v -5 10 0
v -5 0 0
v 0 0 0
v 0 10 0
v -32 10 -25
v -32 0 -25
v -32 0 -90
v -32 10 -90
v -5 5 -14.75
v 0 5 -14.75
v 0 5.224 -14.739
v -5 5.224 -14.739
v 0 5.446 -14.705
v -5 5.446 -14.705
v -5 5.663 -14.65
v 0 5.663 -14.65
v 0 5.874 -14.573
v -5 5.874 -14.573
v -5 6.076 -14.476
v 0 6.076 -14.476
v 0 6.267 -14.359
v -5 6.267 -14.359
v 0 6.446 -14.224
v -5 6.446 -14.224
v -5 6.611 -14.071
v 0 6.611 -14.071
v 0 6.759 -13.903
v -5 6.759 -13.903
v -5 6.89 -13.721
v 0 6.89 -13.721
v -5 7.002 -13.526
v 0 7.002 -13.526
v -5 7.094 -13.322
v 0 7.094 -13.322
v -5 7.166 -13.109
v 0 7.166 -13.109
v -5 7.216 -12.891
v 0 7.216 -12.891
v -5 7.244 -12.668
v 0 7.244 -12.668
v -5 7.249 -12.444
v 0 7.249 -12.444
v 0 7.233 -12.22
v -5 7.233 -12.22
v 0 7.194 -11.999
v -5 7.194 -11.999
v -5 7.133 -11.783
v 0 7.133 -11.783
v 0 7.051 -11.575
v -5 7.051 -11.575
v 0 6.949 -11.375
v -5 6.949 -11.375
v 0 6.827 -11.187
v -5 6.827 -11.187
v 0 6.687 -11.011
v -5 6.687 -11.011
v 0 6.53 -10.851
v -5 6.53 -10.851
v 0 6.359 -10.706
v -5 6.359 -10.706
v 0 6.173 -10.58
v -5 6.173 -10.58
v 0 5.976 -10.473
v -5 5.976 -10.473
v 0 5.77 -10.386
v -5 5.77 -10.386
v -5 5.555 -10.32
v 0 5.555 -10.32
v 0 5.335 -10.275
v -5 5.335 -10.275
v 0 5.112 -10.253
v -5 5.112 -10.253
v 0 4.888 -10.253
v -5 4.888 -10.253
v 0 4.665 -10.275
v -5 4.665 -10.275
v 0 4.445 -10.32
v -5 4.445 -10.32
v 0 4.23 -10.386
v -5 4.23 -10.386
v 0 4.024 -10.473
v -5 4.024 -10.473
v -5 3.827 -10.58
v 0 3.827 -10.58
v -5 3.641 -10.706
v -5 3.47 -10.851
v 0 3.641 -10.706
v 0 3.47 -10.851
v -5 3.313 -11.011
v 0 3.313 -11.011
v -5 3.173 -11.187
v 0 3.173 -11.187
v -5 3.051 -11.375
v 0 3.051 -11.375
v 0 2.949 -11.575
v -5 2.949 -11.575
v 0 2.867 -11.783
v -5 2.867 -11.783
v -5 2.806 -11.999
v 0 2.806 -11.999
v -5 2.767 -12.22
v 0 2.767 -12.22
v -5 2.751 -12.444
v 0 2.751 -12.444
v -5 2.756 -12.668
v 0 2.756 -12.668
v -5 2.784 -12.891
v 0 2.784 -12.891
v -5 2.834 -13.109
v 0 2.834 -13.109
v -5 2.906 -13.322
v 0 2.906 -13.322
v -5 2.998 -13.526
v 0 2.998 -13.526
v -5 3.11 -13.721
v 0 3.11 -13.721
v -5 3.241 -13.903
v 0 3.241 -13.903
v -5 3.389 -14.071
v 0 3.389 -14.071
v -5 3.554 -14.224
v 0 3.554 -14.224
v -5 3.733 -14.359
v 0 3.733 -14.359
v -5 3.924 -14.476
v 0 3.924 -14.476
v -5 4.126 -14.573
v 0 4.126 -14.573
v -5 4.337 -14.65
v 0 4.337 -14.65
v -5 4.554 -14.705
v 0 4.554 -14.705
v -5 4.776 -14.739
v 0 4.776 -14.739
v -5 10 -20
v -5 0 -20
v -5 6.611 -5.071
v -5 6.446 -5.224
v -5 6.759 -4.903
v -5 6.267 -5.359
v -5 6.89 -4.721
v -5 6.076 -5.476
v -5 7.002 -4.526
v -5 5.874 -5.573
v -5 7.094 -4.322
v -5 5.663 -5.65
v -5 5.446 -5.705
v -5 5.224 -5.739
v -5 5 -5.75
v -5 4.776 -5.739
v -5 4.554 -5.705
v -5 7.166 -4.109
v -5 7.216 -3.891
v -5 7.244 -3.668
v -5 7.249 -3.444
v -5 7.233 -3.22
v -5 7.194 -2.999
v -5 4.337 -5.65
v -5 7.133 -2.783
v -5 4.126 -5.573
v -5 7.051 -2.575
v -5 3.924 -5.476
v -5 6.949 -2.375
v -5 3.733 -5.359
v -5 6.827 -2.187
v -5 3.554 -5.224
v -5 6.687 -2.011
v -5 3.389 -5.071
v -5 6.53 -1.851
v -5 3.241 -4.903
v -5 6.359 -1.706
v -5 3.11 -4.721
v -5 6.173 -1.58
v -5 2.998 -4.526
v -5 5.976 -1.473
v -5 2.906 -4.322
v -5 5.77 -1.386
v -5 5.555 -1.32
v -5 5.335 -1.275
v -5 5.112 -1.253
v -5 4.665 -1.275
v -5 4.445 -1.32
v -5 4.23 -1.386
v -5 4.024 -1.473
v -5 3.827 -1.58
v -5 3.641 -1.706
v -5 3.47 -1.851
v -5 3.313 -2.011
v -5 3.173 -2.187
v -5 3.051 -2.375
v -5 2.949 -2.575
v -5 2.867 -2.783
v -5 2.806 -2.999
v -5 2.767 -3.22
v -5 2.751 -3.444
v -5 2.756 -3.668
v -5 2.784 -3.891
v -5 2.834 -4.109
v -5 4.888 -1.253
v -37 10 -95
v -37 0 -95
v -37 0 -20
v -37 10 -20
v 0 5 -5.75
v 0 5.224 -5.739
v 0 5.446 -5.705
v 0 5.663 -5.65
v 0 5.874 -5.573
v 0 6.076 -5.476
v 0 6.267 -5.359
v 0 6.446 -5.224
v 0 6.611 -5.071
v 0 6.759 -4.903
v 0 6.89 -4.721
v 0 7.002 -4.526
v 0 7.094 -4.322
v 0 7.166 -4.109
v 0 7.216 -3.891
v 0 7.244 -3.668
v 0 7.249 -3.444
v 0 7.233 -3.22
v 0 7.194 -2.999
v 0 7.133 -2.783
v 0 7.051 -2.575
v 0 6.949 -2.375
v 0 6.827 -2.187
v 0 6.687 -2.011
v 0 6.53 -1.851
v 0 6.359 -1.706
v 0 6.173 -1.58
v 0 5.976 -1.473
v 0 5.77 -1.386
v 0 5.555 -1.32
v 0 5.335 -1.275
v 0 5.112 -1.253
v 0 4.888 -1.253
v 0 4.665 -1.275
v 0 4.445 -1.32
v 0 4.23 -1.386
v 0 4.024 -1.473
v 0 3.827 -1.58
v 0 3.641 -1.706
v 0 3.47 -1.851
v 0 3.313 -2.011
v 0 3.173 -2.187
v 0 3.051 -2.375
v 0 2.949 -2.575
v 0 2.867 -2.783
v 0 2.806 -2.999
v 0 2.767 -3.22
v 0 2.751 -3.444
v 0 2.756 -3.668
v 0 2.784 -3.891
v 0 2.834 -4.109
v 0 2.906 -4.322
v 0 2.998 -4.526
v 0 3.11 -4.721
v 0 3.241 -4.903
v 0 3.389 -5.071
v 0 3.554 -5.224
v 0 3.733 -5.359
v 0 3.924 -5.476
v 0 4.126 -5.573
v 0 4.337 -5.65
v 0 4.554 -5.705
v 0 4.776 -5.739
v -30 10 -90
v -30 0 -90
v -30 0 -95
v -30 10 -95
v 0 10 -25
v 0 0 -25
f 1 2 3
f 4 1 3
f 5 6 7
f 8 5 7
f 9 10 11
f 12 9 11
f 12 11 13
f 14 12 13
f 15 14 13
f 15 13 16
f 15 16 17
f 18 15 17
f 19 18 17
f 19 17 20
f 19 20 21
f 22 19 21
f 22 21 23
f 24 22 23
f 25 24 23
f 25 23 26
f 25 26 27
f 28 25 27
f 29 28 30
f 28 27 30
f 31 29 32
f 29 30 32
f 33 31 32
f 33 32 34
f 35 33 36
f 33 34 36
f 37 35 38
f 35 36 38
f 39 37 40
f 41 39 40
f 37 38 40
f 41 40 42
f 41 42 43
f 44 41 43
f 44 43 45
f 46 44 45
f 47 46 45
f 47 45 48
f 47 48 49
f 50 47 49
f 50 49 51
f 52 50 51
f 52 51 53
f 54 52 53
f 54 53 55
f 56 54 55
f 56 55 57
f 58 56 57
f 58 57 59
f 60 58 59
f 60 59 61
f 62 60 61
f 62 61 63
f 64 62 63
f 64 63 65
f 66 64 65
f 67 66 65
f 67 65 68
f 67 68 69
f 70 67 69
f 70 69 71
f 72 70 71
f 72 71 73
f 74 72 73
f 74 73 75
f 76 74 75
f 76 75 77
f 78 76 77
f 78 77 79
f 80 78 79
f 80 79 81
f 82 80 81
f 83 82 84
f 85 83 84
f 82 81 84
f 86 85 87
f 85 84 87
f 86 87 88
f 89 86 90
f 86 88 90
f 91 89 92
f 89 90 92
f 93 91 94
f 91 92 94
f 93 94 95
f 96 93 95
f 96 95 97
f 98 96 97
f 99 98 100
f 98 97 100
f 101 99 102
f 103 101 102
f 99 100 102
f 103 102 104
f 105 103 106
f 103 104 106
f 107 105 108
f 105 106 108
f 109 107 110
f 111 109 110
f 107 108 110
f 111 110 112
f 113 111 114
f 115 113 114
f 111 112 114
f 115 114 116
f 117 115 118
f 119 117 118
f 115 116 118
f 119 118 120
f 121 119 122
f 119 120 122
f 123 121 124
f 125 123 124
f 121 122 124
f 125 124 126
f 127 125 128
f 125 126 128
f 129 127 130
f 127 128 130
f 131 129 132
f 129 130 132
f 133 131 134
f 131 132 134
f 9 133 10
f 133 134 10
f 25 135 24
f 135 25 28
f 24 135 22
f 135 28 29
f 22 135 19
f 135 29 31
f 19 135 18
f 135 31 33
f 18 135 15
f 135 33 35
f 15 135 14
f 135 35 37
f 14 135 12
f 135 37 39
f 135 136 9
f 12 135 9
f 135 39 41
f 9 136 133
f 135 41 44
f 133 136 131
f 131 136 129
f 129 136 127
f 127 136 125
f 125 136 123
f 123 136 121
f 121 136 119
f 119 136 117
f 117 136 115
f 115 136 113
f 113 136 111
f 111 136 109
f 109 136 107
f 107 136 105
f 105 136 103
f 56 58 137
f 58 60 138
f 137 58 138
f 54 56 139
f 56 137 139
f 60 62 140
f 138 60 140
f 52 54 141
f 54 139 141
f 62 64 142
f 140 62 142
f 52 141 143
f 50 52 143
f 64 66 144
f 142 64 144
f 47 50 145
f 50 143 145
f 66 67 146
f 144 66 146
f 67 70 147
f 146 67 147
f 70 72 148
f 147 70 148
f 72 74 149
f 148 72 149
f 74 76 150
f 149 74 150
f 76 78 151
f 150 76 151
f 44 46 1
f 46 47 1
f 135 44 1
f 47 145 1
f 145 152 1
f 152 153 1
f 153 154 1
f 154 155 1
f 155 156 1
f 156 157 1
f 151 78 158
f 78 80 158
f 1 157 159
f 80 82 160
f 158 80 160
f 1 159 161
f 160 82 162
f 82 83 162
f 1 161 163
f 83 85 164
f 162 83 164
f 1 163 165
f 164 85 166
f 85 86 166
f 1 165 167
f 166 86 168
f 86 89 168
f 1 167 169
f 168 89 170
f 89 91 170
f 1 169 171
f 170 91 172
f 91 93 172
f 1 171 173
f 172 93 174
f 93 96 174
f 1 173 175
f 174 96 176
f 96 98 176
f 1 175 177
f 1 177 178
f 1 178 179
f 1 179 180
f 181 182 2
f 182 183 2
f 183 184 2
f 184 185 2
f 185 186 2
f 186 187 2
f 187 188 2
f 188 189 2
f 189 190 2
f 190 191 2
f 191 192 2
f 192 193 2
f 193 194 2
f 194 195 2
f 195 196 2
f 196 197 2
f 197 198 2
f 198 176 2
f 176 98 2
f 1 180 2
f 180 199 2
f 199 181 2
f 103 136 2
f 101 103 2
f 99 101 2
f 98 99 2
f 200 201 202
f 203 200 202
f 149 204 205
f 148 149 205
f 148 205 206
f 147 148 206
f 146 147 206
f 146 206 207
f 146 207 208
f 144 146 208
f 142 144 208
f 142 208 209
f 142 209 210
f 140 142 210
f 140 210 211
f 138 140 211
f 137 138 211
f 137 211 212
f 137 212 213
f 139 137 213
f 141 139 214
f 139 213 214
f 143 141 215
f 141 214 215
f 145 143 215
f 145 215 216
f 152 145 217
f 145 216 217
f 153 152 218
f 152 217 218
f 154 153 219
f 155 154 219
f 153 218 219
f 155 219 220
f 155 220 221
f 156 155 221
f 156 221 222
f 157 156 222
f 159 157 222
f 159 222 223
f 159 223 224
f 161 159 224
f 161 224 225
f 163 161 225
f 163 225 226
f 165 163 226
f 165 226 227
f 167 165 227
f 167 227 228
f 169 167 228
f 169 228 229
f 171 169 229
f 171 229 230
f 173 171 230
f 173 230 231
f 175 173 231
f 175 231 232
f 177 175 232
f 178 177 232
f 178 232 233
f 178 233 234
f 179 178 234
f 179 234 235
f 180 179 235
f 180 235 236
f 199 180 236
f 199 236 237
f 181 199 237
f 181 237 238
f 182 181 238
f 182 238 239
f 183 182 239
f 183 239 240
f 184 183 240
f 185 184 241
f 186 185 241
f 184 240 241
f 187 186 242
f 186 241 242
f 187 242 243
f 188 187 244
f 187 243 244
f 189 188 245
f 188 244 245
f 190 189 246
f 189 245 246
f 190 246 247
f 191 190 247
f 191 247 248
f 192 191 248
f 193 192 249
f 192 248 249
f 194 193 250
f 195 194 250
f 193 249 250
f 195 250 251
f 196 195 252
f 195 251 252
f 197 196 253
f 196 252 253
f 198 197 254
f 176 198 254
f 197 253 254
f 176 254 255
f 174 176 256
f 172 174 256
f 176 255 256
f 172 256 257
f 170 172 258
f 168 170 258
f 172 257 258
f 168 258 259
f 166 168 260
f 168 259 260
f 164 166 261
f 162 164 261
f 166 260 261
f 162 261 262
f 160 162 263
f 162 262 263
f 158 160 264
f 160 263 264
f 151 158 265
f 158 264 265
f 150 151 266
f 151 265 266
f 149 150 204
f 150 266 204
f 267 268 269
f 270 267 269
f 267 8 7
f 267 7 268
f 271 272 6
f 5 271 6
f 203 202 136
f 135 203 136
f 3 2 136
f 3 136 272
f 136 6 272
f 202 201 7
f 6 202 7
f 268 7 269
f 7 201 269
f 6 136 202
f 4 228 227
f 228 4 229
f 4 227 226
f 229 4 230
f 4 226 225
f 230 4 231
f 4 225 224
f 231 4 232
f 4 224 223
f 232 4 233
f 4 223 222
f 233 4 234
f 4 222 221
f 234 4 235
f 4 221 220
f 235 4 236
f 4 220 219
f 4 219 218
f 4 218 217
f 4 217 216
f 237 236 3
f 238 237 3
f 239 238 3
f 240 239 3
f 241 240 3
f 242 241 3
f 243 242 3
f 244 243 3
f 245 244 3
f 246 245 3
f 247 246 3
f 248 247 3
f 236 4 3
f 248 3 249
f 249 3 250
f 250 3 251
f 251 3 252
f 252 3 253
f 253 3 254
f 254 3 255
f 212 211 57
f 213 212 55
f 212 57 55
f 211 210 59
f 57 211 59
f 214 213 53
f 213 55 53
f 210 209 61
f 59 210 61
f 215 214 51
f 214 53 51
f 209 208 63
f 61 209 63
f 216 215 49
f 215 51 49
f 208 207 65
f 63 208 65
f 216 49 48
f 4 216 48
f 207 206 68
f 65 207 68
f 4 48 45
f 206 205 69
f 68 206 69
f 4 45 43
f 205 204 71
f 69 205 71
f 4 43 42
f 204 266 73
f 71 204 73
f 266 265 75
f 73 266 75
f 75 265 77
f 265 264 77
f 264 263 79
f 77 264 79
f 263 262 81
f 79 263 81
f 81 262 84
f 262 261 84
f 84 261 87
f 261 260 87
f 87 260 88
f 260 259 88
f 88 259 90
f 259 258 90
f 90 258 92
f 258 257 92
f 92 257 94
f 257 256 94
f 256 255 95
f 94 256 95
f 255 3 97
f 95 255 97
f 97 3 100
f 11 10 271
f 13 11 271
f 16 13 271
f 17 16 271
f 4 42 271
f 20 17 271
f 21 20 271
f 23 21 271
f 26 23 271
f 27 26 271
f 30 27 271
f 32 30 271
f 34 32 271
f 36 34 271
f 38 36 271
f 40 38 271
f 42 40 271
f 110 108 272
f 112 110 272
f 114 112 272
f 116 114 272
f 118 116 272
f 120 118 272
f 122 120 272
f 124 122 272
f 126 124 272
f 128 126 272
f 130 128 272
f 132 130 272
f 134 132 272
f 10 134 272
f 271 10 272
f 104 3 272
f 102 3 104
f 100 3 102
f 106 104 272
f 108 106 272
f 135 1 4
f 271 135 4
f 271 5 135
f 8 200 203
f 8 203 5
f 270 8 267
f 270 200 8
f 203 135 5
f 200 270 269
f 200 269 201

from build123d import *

# Parameters (mm, degrees)
BOSS_EXTRUDE1_DEPTH = 10
SKETCH3_R           = 2.25
CUT_EXTRUDE1_DEPTH  = 38


with BuildPart() as part:
    # Sketch2 → Boss-Extrude1 (new body)
    with BuildSketch(Plane(origin=(0, 0, 0), x_dir=(1, 0, 0), z_dir=(0, 1, 0))):
        Polygon((-5, 0), (0, 0), (0, 25), (-32, 25), (-32, 90), (-30, 90), (-30, 95), (-37, 95), (-37, 20), (-5, 20), align=None)
    extrude(amount=BOSS_EXTRUDE1_DEPTH)

    # Sketch3 → Cut-Extrude1 (cut, through all)
    with BuildSketch(Plane(origin=(0, 0, 0), x_dir=(0, 0, -1), z_dir=(1, 0, 0))):
        with Locations((3.5, 5)):
            Circle(SKETCH3_R)
        with Locations((12.5, 5)):
            Circle(SKETCH3_R)
    extrude(amount=-CUT_EXTRUDE1_DEPTH, mode=Mode.SUBTRACT)


solid = part.part
